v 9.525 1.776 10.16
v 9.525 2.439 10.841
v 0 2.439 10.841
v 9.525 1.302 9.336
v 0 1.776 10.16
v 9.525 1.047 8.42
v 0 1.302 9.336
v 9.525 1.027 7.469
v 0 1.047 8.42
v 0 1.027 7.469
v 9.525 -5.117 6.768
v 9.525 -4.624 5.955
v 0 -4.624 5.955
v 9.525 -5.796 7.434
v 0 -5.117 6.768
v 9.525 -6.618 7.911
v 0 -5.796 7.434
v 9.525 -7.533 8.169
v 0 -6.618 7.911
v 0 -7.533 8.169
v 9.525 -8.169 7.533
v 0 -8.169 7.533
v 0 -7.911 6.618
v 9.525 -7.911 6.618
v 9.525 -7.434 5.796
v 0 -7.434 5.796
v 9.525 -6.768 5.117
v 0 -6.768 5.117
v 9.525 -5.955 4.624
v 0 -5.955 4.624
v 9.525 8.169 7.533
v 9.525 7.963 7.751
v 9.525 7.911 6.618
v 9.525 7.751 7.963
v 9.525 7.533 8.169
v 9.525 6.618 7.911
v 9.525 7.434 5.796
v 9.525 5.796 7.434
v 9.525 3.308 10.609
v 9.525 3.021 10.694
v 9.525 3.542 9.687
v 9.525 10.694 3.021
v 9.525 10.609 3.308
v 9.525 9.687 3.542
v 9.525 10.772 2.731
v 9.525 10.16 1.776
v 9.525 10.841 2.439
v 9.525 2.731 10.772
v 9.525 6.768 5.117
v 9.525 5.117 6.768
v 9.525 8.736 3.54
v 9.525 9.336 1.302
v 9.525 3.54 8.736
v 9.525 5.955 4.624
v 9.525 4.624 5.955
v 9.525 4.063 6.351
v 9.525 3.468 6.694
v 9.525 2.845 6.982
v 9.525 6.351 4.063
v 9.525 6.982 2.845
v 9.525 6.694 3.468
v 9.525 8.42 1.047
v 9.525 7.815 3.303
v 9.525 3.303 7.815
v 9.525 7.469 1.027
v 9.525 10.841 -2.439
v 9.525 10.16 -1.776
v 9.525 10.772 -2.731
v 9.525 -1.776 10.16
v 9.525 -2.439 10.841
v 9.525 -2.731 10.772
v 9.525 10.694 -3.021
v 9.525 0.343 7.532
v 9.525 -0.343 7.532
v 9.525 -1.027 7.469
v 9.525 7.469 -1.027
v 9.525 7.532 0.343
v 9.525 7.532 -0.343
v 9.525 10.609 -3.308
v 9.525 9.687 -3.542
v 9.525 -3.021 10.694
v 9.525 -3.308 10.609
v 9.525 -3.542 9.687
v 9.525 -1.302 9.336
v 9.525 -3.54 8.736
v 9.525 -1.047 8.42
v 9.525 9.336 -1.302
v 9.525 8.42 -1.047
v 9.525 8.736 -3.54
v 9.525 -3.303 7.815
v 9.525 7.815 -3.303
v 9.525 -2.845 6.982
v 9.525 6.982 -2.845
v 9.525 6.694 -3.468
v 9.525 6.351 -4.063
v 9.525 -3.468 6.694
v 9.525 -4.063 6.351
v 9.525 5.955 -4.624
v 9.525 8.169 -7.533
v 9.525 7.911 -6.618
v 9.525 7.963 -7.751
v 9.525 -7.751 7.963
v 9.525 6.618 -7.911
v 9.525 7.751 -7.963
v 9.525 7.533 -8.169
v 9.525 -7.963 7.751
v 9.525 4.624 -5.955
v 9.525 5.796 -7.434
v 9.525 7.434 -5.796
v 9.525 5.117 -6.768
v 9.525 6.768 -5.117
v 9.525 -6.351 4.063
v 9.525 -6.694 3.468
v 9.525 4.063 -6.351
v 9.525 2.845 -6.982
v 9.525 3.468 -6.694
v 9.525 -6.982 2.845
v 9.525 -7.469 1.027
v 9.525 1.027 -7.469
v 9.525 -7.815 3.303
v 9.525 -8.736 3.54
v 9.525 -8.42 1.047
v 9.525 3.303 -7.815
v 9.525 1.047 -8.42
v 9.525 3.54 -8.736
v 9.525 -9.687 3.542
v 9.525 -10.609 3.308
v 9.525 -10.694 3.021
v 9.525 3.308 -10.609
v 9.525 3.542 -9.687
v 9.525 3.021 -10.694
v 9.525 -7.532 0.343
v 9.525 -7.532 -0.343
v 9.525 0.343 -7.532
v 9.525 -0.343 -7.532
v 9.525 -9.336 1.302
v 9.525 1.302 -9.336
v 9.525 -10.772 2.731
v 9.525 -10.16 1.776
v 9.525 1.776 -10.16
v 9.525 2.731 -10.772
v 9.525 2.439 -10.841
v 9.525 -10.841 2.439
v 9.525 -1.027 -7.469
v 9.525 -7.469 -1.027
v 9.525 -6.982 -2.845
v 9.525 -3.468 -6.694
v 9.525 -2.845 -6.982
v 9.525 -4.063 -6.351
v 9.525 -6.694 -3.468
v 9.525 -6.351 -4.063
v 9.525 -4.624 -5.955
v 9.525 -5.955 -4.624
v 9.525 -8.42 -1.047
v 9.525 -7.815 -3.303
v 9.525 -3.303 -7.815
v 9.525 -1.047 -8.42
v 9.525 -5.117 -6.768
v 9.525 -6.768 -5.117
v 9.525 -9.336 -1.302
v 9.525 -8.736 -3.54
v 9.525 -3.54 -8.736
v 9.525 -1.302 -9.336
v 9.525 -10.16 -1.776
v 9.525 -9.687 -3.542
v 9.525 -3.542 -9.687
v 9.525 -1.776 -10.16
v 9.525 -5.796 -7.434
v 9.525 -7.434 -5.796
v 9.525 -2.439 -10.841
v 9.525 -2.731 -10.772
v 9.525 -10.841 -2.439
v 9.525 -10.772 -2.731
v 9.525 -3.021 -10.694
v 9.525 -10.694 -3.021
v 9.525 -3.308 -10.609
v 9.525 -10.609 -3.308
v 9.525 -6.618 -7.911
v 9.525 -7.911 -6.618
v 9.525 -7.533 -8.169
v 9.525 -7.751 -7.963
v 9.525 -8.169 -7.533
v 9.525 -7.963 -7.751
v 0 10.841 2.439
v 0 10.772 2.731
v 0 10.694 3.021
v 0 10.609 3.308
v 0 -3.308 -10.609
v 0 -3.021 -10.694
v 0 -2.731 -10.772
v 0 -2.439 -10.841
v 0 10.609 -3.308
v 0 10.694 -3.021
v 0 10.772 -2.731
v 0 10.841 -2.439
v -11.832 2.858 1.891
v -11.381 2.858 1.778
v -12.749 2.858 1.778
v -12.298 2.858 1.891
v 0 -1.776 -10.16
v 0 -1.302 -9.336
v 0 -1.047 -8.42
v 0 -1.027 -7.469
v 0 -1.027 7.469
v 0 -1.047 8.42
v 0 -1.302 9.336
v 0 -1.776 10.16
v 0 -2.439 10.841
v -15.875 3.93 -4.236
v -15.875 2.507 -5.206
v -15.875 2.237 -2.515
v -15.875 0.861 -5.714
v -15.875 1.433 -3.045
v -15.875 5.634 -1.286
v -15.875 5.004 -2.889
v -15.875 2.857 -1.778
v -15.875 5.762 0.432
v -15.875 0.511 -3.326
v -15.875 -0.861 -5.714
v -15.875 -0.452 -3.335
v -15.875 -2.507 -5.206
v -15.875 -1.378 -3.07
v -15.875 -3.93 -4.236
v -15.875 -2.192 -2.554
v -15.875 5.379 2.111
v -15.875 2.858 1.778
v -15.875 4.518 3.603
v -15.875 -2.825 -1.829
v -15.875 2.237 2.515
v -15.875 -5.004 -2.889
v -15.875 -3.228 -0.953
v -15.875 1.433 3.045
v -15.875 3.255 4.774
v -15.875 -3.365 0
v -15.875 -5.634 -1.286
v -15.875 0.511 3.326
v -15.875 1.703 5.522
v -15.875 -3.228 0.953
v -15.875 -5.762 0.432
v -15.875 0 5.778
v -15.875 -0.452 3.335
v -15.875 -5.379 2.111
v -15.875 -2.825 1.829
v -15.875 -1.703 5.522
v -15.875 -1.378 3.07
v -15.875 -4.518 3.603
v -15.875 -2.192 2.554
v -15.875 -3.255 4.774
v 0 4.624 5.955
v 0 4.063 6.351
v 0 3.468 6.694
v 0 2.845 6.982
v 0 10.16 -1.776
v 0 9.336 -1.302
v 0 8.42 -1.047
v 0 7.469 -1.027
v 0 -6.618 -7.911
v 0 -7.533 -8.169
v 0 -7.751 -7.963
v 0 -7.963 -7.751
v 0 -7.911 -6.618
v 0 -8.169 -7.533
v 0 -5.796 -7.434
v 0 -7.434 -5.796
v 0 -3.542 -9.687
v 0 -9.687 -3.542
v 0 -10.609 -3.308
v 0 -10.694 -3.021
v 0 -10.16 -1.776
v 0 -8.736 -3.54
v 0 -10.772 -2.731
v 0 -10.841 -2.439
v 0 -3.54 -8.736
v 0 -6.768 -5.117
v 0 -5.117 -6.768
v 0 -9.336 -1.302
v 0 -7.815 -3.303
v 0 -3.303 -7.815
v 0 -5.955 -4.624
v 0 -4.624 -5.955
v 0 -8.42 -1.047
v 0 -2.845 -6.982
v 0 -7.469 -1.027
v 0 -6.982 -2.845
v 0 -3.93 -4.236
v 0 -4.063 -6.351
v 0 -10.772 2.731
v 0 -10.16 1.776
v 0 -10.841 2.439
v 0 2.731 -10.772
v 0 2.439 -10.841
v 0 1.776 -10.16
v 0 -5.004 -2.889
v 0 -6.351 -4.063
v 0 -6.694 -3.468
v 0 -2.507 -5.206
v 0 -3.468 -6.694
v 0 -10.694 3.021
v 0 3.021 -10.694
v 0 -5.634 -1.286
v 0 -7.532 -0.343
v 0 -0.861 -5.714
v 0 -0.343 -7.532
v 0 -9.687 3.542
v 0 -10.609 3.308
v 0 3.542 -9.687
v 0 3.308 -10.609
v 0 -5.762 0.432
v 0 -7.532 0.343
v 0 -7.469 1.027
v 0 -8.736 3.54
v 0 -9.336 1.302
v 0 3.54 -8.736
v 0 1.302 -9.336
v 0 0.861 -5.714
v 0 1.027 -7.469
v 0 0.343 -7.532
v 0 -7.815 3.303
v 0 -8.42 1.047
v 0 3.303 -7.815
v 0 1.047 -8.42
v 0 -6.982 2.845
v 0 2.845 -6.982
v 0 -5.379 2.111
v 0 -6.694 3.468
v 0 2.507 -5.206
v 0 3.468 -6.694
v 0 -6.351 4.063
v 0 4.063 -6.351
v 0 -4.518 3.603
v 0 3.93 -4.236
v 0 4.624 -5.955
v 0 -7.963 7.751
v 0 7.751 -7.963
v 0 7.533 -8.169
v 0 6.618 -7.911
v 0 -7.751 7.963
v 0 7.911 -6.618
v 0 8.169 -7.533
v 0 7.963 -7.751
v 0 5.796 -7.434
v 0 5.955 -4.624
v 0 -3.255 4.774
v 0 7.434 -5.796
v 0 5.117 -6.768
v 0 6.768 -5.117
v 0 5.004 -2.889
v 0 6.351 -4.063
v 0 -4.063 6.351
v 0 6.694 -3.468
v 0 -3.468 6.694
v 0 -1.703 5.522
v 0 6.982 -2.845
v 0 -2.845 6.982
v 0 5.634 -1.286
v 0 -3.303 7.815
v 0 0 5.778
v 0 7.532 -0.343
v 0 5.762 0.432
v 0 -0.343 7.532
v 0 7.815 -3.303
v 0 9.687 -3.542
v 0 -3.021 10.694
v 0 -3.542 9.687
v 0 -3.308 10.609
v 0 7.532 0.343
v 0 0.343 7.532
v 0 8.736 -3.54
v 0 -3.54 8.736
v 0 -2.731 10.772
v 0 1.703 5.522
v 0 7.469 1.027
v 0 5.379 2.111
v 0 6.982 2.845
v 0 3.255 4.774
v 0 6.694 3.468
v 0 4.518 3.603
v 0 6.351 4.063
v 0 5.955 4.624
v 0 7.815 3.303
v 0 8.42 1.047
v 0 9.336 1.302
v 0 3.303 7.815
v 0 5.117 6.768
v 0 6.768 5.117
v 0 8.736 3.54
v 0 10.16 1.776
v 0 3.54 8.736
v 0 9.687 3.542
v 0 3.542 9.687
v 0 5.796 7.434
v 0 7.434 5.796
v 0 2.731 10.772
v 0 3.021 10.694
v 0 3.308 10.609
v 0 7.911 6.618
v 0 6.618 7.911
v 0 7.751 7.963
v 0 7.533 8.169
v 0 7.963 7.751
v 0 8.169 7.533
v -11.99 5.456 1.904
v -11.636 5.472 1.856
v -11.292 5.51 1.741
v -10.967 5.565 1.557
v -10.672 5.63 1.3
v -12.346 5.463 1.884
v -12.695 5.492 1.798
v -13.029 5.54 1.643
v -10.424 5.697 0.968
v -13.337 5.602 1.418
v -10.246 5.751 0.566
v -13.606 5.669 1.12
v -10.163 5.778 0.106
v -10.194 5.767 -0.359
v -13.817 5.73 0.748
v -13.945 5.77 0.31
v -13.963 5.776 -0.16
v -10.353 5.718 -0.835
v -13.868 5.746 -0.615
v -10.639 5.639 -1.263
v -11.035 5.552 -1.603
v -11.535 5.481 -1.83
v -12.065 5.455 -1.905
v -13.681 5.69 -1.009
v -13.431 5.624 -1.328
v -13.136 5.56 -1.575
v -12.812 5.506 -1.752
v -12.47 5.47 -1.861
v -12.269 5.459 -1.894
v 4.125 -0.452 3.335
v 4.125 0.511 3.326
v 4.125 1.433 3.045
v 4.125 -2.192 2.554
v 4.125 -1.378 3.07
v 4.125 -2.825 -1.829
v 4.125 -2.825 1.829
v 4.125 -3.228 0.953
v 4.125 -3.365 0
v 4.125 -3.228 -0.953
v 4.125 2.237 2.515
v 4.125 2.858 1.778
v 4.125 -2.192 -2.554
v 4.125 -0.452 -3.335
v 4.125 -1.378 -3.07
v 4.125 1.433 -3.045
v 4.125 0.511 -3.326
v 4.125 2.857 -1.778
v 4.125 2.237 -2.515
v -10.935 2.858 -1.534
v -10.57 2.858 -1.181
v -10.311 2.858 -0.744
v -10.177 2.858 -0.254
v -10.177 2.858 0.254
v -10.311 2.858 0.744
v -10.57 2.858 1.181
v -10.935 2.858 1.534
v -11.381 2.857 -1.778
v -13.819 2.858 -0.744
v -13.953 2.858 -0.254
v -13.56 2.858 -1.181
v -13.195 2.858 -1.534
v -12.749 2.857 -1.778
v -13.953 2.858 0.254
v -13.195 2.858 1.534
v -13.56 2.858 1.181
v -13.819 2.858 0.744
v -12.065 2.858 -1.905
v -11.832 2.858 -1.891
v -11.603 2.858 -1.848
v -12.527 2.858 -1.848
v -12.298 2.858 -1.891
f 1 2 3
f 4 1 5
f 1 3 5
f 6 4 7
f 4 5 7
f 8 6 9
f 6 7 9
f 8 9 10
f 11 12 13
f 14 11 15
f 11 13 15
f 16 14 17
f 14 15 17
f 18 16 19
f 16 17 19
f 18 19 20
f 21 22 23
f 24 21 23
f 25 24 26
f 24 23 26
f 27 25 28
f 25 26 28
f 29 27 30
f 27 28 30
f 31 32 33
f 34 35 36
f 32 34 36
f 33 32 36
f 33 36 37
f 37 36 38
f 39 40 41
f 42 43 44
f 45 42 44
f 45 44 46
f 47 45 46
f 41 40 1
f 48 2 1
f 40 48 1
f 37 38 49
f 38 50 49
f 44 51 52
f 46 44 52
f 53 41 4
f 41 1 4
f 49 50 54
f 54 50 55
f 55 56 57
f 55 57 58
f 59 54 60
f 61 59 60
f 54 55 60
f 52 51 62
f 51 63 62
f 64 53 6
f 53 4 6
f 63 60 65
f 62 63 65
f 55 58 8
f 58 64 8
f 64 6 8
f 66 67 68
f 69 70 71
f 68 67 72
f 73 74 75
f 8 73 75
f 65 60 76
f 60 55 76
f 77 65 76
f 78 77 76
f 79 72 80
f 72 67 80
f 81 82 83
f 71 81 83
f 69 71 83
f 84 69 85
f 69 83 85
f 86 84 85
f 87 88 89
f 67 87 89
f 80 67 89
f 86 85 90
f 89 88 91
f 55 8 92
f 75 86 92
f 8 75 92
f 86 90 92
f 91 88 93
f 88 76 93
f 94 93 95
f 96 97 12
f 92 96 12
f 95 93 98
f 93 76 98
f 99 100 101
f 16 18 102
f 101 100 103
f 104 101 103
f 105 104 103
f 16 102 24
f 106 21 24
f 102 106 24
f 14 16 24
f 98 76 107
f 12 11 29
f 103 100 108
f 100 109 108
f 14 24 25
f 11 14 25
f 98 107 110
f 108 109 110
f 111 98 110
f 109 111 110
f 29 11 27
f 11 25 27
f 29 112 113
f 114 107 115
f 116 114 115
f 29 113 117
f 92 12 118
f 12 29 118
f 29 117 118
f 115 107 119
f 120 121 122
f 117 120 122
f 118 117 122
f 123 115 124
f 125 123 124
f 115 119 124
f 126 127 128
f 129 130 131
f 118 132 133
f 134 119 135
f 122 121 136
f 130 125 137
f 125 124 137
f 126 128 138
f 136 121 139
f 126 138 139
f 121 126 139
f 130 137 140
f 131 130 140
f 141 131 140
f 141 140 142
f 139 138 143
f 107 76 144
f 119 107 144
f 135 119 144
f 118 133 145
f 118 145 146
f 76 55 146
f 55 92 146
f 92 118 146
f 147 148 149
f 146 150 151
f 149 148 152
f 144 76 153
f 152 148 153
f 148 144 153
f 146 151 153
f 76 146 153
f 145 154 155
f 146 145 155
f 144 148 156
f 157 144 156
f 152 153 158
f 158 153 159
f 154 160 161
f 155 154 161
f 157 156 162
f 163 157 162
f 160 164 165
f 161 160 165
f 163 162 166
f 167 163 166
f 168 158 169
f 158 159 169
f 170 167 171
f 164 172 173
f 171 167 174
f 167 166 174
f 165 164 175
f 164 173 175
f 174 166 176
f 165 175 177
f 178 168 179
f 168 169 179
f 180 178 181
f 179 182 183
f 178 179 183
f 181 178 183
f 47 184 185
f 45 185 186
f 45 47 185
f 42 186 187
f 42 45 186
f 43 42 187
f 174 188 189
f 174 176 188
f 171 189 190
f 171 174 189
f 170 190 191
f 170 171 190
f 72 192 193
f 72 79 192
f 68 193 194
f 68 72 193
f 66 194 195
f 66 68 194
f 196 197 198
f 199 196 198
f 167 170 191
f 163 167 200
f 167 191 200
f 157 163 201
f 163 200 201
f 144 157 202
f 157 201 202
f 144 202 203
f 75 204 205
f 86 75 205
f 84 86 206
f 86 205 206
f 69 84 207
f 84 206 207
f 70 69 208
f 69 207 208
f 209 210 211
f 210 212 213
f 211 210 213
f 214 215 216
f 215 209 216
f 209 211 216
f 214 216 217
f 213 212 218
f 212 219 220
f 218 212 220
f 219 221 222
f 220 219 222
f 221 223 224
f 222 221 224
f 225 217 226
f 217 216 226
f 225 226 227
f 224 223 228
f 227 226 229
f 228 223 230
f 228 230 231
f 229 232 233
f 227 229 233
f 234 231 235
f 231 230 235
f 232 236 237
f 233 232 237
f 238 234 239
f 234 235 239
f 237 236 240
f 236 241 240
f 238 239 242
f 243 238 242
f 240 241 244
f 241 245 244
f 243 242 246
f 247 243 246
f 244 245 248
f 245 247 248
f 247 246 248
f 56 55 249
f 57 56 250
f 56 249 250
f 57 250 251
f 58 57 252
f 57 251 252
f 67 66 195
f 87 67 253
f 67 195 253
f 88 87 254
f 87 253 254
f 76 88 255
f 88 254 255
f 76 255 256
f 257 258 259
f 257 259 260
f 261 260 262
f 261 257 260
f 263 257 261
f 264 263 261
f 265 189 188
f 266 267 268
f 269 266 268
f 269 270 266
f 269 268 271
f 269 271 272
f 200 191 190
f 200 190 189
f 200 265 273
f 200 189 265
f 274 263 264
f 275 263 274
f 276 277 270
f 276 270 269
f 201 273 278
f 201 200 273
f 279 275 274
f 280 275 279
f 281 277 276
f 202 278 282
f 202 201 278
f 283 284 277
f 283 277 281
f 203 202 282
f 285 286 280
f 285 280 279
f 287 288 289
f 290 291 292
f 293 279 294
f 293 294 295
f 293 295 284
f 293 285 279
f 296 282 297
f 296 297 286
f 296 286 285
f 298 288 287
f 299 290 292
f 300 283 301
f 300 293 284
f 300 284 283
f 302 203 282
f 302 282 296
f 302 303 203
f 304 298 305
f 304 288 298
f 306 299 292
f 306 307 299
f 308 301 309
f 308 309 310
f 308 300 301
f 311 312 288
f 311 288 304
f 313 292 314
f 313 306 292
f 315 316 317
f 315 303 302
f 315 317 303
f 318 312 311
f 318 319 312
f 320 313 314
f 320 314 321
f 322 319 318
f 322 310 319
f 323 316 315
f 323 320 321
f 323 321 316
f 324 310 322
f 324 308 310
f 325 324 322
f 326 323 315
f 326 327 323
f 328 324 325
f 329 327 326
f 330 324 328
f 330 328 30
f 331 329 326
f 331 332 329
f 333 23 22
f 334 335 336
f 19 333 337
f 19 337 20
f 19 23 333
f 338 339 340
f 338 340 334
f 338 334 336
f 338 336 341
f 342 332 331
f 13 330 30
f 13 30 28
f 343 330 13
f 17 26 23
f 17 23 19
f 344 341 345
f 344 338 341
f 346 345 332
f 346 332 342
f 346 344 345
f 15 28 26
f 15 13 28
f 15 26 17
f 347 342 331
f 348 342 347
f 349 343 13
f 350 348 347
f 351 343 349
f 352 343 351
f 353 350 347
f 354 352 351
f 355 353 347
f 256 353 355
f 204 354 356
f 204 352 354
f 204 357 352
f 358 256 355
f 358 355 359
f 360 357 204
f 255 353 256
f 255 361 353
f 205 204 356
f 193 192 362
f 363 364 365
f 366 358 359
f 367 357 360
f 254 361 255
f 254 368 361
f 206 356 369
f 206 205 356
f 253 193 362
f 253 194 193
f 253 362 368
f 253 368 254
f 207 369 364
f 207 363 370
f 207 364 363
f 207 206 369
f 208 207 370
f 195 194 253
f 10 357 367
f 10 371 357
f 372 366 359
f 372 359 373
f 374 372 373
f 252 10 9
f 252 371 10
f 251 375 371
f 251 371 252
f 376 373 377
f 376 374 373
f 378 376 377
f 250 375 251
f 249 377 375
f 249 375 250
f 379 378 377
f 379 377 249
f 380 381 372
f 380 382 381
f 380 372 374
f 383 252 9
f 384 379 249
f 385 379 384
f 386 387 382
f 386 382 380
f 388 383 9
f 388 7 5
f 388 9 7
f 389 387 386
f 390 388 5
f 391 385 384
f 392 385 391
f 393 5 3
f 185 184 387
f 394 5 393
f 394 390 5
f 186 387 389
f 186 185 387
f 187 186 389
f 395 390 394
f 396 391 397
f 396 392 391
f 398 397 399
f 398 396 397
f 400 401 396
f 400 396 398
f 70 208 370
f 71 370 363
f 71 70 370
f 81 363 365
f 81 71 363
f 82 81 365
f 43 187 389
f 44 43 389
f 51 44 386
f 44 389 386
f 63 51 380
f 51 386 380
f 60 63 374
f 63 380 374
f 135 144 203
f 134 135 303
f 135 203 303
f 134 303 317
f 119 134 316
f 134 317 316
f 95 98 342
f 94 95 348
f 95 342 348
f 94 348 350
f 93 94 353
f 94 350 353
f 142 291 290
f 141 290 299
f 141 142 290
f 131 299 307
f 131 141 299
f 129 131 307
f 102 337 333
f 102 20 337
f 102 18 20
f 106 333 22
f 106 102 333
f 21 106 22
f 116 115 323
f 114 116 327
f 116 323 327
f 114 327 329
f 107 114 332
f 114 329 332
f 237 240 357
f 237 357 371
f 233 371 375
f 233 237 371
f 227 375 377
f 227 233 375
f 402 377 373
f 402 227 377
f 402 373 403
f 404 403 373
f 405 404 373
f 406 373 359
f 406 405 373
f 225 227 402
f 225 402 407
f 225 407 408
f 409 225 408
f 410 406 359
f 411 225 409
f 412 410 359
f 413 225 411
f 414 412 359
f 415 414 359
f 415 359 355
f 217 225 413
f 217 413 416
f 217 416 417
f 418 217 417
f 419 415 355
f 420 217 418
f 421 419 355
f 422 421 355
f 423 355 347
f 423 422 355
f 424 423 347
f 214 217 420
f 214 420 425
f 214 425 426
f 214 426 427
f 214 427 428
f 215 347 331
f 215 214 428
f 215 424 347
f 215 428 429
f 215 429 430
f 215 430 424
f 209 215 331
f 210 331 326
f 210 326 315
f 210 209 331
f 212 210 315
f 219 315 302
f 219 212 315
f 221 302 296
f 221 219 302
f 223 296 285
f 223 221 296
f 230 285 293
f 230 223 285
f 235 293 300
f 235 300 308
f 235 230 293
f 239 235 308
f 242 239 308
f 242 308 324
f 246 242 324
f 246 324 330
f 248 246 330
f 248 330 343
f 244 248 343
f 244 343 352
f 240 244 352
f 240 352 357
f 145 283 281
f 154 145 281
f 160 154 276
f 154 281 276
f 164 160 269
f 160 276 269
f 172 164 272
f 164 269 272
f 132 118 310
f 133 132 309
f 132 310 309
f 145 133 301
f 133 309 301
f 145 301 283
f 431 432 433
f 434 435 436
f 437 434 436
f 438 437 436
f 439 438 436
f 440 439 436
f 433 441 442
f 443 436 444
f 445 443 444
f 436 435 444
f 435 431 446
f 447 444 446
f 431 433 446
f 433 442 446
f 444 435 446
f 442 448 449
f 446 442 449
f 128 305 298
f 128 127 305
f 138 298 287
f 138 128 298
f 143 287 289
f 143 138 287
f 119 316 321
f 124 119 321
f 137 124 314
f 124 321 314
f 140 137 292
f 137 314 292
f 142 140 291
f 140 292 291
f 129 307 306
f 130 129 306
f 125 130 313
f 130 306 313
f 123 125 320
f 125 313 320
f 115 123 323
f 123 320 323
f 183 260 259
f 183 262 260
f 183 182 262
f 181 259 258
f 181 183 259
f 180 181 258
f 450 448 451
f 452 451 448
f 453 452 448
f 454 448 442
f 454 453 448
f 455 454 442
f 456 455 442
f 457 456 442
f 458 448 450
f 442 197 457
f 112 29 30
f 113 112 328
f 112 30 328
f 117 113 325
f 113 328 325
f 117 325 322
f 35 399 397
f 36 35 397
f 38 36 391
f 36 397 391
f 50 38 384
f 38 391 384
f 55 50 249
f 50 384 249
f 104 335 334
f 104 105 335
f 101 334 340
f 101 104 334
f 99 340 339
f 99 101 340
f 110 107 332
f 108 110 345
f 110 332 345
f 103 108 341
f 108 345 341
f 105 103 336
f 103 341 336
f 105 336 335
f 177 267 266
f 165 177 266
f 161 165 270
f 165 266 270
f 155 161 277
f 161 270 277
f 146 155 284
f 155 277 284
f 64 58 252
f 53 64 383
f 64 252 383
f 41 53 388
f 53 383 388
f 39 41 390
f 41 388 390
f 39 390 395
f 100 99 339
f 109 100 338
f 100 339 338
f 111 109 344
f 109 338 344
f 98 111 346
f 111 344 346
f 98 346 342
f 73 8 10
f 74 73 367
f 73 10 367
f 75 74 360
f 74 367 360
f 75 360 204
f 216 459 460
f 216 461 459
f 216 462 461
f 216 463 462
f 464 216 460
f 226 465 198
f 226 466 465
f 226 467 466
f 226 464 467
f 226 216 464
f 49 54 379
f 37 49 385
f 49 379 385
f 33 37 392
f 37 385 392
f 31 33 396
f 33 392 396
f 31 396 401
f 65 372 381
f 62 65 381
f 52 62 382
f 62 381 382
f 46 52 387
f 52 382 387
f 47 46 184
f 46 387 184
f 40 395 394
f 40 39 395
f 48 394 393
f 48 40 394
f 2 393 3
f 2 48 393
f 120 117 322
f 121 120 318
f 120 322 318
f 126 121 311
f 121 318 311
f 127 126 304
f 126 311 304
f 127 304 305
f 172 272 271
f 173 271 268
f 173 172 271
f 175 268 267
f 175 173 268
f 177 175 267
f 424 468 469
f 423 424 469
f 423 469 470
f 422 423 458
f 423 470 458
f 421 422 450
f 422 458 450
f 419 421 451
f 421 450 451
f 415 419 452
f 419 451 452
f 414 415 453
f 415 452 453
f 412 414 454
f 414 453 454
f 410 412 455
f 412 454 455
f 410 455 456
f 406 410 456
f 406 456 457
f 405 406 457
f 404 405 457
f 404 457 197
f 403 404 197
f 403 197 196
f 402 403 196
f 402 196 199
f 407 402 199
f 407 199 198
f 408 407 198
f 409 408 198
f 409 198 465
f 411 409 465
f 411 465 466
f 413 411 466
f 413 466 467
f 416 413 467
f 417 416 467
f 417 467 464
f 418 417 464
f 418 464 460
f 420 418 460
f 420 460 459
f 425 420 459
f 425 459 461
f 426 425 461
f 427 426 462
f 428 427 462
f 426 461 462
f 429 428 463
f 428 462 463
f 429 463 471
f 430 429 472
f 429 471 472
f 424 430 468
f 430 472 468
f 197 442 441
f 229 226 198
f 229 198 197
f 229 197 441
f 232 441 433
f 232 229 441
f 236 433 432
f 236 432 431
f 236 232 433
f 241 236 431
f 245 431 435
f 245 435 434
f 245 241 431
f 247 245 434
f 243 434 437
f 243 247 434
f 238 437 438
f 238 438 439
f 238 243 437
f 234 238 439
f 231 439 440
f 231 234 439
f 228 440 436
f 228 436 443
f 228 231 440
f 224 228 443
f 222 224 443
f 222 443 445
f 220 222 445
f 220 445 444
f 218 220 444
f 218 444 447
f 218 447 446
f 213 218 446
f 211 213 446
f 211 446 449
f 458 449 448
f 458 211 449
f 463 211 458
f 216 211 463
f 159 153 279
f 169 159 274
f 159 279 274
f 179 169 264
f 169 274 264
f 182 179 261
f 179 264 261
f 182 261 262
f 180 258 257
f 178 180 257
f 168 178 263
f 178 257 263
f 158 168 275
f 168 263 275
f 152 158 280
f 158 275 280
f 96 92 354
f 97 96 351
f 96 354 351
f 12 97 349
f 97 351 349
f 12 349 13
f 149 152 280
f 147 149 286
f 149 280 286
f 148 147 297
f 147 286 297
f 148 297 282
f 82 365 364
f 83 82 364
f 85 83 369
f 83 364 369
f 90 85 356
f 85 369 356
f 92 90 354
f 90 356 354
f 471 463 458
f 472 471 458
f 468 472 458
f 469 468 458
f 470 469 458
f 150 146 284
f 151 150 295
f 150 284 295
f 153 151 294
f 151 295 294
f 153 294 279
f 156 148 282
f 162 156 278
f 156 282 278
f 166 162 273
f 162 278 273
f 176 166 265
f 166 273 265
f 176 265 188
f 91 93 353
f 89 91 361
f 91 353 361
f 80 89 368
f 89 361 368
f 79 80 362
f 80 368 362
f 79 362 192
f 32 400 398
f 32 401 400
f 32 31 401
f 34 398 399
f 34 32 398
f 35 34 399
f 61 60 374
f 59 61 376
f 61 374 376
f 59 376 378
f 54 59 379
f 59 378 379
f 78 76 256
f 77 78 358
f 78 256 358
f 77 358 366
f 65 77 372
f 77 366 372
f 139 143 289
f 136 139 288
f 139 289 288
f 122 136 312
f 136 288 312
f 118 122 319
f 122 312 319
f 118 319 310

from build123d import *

# Parameters (mm, degrees)
BASPROSKE_W         = 9.525
BASPROSKE_H         = 11.1125
TOOTHCUT_DEPTH      = 19.376641083
TEETHCUTS_COUNT     = 12
TEETHCUTS_ANGLE     = 330
BORSKE_R            = 3.175
BORE_DEPTH          = 50.8000508
BOSS_EXTRUDE1_START = -25.4
SKETCH2_R           = 7.539355
BOSS_EXTRUDE1_DEPTH = 25.4
CUT_EXTRUDE1_DEPTH  = 20
SKETCH5_R           = 1.905
CUT_EXTRUDE2_DEPTH  = 24.605363577
SKETCH6_R           = 12.7
SKETCH6_R_2         = 5.7785
CUT_EXTRUDE3_DEPTH  = 15.875


with BuildPart() as part:
    # BasProSke → Base-Revolve (revolve)
    with BuildSketch(Plane(origin=(0, 0, 0), x_dir=(1, 0, 0), z_dir=(0, 1, 0)), mode=Mode.PRIVATE) as base_revolve_sk:
        with Locations((4.7625, 5.55625)):
            Rectangle(BASPROSKE_W, BASPROSKE_H)
    revolve(base_revolve_sk.sketch.rotate(Axis((-10, 0, 0), (1, 0, 0)), 180), axis=Axis((-10, 0, 0), (1, 0, 0)))

    # TooCutSke → ToothCut (cut, through all)
    with BuildSketch(Plane(origin=(0, 0, 0), x_dir=(0, 0, -1), z_dir=(1, 0, 0))):
        with BuildLine():
            ThreePointArc((1.026937745, 7.469087808), (0, 7.539355), (-1.026937745, 7.469087808))
            ThreePointArc((-1.026937745, 7.469087808), (-1.30857978, 9.35080814), (-2.465050847, 10.861691431))
            ThreePointArc((-2.465050847, 10.861691431), (0, 11.1379), (2.465050847, 10.861691431))
            ThreePointArc((2.465050847, 10.861691431), (1.30857978, 9.35080814), (1.026937745, 7.469087808))
        make_face()
    toothcut = extrude(amount=TOOTHCUT_DEPTH, mode=Mode.SUBTRACT)

    # TeethCuts: ToothCut ×12 about axis
    teethcuts_axis = Axis((-10, 0, 0), (1, 0, 0))
    for i in range(1, TEETHCUTS_COUNT):
        add(toothcut.rotate(teethcuts_axis, i * TEETHCUTS_ANGLE / (TEETHCUTS_COUNT - 1)), mode=Mode.SUBTRACT)

    # BorSke → Bore (cut, symmetric)
    with BuildSketch(Plane(origin=(0, 0, 0), x_dir=(0, 0, -1), z_dir=(1, 0, 0))):
        with Locations(Location((0, 0, 0), (0, 0, 180))):
            Circle(BORSKE_R)
    extrude(amount=BORE_DEPTH, both=True, mode=Mode.SUBTRACT)

    # Sketch2 → Boss-Extrude1 (add)
    with BuildSketch(Plane(origin=(9.525, 0, 0), x_dir=(0, 0, -1), z_dir=(1, 0, 0)).offset(BOSS_EXTRUDE1_START)):
        with Locations(Location((0, 0, 0), (0, 0, 172.171388978))):
            Circle(SKETCH2_R)
    extrude(amount=BOSS_EXTRUDE1_DEPTH)

    # Sketch3 → Cut-Extrude1 (cut)
    with BuildSketch(Plane.ZY.offset(15.875)):
        with BuildLine():
            Line((-1.778, 2.8575), (1.778, 2.8575))
            ThreePointArc((1.778, 2.8575), (0, -3.3655), (-1.778, 2.8575))
        make_face()
    extrude(amount=-CUT_EXTRUDE1_DEPTH, mode=Mode.SUBTRACT)

    # Sketch5 → Cut-Extrude2 (cut, through all)
    with BuildSketch(Plane.XZ.offset(-2.8575)):
        with Locations(Location((-12.065, 0, 0), (0, 0, 270))):
            Circle(SKETCH5_R)
    extrude(amount=-CUT_EXTRUDE2_DEPTH, mode=Mode.SUBTRACT)

    # Sketch6 → Cut-Extrude3 (cut)
    with BuildSketch(Plane.ZY.offset(15.875)):
        Circle(SKETCH6_R)
        Circle(SKETCH6_R_2, mode=Mode.SUBTRACT)
    extrude(amount=-CUT_EXTRUDE3_DEPTH, mode=Mode.SUBTRACT)


solid = part.part
